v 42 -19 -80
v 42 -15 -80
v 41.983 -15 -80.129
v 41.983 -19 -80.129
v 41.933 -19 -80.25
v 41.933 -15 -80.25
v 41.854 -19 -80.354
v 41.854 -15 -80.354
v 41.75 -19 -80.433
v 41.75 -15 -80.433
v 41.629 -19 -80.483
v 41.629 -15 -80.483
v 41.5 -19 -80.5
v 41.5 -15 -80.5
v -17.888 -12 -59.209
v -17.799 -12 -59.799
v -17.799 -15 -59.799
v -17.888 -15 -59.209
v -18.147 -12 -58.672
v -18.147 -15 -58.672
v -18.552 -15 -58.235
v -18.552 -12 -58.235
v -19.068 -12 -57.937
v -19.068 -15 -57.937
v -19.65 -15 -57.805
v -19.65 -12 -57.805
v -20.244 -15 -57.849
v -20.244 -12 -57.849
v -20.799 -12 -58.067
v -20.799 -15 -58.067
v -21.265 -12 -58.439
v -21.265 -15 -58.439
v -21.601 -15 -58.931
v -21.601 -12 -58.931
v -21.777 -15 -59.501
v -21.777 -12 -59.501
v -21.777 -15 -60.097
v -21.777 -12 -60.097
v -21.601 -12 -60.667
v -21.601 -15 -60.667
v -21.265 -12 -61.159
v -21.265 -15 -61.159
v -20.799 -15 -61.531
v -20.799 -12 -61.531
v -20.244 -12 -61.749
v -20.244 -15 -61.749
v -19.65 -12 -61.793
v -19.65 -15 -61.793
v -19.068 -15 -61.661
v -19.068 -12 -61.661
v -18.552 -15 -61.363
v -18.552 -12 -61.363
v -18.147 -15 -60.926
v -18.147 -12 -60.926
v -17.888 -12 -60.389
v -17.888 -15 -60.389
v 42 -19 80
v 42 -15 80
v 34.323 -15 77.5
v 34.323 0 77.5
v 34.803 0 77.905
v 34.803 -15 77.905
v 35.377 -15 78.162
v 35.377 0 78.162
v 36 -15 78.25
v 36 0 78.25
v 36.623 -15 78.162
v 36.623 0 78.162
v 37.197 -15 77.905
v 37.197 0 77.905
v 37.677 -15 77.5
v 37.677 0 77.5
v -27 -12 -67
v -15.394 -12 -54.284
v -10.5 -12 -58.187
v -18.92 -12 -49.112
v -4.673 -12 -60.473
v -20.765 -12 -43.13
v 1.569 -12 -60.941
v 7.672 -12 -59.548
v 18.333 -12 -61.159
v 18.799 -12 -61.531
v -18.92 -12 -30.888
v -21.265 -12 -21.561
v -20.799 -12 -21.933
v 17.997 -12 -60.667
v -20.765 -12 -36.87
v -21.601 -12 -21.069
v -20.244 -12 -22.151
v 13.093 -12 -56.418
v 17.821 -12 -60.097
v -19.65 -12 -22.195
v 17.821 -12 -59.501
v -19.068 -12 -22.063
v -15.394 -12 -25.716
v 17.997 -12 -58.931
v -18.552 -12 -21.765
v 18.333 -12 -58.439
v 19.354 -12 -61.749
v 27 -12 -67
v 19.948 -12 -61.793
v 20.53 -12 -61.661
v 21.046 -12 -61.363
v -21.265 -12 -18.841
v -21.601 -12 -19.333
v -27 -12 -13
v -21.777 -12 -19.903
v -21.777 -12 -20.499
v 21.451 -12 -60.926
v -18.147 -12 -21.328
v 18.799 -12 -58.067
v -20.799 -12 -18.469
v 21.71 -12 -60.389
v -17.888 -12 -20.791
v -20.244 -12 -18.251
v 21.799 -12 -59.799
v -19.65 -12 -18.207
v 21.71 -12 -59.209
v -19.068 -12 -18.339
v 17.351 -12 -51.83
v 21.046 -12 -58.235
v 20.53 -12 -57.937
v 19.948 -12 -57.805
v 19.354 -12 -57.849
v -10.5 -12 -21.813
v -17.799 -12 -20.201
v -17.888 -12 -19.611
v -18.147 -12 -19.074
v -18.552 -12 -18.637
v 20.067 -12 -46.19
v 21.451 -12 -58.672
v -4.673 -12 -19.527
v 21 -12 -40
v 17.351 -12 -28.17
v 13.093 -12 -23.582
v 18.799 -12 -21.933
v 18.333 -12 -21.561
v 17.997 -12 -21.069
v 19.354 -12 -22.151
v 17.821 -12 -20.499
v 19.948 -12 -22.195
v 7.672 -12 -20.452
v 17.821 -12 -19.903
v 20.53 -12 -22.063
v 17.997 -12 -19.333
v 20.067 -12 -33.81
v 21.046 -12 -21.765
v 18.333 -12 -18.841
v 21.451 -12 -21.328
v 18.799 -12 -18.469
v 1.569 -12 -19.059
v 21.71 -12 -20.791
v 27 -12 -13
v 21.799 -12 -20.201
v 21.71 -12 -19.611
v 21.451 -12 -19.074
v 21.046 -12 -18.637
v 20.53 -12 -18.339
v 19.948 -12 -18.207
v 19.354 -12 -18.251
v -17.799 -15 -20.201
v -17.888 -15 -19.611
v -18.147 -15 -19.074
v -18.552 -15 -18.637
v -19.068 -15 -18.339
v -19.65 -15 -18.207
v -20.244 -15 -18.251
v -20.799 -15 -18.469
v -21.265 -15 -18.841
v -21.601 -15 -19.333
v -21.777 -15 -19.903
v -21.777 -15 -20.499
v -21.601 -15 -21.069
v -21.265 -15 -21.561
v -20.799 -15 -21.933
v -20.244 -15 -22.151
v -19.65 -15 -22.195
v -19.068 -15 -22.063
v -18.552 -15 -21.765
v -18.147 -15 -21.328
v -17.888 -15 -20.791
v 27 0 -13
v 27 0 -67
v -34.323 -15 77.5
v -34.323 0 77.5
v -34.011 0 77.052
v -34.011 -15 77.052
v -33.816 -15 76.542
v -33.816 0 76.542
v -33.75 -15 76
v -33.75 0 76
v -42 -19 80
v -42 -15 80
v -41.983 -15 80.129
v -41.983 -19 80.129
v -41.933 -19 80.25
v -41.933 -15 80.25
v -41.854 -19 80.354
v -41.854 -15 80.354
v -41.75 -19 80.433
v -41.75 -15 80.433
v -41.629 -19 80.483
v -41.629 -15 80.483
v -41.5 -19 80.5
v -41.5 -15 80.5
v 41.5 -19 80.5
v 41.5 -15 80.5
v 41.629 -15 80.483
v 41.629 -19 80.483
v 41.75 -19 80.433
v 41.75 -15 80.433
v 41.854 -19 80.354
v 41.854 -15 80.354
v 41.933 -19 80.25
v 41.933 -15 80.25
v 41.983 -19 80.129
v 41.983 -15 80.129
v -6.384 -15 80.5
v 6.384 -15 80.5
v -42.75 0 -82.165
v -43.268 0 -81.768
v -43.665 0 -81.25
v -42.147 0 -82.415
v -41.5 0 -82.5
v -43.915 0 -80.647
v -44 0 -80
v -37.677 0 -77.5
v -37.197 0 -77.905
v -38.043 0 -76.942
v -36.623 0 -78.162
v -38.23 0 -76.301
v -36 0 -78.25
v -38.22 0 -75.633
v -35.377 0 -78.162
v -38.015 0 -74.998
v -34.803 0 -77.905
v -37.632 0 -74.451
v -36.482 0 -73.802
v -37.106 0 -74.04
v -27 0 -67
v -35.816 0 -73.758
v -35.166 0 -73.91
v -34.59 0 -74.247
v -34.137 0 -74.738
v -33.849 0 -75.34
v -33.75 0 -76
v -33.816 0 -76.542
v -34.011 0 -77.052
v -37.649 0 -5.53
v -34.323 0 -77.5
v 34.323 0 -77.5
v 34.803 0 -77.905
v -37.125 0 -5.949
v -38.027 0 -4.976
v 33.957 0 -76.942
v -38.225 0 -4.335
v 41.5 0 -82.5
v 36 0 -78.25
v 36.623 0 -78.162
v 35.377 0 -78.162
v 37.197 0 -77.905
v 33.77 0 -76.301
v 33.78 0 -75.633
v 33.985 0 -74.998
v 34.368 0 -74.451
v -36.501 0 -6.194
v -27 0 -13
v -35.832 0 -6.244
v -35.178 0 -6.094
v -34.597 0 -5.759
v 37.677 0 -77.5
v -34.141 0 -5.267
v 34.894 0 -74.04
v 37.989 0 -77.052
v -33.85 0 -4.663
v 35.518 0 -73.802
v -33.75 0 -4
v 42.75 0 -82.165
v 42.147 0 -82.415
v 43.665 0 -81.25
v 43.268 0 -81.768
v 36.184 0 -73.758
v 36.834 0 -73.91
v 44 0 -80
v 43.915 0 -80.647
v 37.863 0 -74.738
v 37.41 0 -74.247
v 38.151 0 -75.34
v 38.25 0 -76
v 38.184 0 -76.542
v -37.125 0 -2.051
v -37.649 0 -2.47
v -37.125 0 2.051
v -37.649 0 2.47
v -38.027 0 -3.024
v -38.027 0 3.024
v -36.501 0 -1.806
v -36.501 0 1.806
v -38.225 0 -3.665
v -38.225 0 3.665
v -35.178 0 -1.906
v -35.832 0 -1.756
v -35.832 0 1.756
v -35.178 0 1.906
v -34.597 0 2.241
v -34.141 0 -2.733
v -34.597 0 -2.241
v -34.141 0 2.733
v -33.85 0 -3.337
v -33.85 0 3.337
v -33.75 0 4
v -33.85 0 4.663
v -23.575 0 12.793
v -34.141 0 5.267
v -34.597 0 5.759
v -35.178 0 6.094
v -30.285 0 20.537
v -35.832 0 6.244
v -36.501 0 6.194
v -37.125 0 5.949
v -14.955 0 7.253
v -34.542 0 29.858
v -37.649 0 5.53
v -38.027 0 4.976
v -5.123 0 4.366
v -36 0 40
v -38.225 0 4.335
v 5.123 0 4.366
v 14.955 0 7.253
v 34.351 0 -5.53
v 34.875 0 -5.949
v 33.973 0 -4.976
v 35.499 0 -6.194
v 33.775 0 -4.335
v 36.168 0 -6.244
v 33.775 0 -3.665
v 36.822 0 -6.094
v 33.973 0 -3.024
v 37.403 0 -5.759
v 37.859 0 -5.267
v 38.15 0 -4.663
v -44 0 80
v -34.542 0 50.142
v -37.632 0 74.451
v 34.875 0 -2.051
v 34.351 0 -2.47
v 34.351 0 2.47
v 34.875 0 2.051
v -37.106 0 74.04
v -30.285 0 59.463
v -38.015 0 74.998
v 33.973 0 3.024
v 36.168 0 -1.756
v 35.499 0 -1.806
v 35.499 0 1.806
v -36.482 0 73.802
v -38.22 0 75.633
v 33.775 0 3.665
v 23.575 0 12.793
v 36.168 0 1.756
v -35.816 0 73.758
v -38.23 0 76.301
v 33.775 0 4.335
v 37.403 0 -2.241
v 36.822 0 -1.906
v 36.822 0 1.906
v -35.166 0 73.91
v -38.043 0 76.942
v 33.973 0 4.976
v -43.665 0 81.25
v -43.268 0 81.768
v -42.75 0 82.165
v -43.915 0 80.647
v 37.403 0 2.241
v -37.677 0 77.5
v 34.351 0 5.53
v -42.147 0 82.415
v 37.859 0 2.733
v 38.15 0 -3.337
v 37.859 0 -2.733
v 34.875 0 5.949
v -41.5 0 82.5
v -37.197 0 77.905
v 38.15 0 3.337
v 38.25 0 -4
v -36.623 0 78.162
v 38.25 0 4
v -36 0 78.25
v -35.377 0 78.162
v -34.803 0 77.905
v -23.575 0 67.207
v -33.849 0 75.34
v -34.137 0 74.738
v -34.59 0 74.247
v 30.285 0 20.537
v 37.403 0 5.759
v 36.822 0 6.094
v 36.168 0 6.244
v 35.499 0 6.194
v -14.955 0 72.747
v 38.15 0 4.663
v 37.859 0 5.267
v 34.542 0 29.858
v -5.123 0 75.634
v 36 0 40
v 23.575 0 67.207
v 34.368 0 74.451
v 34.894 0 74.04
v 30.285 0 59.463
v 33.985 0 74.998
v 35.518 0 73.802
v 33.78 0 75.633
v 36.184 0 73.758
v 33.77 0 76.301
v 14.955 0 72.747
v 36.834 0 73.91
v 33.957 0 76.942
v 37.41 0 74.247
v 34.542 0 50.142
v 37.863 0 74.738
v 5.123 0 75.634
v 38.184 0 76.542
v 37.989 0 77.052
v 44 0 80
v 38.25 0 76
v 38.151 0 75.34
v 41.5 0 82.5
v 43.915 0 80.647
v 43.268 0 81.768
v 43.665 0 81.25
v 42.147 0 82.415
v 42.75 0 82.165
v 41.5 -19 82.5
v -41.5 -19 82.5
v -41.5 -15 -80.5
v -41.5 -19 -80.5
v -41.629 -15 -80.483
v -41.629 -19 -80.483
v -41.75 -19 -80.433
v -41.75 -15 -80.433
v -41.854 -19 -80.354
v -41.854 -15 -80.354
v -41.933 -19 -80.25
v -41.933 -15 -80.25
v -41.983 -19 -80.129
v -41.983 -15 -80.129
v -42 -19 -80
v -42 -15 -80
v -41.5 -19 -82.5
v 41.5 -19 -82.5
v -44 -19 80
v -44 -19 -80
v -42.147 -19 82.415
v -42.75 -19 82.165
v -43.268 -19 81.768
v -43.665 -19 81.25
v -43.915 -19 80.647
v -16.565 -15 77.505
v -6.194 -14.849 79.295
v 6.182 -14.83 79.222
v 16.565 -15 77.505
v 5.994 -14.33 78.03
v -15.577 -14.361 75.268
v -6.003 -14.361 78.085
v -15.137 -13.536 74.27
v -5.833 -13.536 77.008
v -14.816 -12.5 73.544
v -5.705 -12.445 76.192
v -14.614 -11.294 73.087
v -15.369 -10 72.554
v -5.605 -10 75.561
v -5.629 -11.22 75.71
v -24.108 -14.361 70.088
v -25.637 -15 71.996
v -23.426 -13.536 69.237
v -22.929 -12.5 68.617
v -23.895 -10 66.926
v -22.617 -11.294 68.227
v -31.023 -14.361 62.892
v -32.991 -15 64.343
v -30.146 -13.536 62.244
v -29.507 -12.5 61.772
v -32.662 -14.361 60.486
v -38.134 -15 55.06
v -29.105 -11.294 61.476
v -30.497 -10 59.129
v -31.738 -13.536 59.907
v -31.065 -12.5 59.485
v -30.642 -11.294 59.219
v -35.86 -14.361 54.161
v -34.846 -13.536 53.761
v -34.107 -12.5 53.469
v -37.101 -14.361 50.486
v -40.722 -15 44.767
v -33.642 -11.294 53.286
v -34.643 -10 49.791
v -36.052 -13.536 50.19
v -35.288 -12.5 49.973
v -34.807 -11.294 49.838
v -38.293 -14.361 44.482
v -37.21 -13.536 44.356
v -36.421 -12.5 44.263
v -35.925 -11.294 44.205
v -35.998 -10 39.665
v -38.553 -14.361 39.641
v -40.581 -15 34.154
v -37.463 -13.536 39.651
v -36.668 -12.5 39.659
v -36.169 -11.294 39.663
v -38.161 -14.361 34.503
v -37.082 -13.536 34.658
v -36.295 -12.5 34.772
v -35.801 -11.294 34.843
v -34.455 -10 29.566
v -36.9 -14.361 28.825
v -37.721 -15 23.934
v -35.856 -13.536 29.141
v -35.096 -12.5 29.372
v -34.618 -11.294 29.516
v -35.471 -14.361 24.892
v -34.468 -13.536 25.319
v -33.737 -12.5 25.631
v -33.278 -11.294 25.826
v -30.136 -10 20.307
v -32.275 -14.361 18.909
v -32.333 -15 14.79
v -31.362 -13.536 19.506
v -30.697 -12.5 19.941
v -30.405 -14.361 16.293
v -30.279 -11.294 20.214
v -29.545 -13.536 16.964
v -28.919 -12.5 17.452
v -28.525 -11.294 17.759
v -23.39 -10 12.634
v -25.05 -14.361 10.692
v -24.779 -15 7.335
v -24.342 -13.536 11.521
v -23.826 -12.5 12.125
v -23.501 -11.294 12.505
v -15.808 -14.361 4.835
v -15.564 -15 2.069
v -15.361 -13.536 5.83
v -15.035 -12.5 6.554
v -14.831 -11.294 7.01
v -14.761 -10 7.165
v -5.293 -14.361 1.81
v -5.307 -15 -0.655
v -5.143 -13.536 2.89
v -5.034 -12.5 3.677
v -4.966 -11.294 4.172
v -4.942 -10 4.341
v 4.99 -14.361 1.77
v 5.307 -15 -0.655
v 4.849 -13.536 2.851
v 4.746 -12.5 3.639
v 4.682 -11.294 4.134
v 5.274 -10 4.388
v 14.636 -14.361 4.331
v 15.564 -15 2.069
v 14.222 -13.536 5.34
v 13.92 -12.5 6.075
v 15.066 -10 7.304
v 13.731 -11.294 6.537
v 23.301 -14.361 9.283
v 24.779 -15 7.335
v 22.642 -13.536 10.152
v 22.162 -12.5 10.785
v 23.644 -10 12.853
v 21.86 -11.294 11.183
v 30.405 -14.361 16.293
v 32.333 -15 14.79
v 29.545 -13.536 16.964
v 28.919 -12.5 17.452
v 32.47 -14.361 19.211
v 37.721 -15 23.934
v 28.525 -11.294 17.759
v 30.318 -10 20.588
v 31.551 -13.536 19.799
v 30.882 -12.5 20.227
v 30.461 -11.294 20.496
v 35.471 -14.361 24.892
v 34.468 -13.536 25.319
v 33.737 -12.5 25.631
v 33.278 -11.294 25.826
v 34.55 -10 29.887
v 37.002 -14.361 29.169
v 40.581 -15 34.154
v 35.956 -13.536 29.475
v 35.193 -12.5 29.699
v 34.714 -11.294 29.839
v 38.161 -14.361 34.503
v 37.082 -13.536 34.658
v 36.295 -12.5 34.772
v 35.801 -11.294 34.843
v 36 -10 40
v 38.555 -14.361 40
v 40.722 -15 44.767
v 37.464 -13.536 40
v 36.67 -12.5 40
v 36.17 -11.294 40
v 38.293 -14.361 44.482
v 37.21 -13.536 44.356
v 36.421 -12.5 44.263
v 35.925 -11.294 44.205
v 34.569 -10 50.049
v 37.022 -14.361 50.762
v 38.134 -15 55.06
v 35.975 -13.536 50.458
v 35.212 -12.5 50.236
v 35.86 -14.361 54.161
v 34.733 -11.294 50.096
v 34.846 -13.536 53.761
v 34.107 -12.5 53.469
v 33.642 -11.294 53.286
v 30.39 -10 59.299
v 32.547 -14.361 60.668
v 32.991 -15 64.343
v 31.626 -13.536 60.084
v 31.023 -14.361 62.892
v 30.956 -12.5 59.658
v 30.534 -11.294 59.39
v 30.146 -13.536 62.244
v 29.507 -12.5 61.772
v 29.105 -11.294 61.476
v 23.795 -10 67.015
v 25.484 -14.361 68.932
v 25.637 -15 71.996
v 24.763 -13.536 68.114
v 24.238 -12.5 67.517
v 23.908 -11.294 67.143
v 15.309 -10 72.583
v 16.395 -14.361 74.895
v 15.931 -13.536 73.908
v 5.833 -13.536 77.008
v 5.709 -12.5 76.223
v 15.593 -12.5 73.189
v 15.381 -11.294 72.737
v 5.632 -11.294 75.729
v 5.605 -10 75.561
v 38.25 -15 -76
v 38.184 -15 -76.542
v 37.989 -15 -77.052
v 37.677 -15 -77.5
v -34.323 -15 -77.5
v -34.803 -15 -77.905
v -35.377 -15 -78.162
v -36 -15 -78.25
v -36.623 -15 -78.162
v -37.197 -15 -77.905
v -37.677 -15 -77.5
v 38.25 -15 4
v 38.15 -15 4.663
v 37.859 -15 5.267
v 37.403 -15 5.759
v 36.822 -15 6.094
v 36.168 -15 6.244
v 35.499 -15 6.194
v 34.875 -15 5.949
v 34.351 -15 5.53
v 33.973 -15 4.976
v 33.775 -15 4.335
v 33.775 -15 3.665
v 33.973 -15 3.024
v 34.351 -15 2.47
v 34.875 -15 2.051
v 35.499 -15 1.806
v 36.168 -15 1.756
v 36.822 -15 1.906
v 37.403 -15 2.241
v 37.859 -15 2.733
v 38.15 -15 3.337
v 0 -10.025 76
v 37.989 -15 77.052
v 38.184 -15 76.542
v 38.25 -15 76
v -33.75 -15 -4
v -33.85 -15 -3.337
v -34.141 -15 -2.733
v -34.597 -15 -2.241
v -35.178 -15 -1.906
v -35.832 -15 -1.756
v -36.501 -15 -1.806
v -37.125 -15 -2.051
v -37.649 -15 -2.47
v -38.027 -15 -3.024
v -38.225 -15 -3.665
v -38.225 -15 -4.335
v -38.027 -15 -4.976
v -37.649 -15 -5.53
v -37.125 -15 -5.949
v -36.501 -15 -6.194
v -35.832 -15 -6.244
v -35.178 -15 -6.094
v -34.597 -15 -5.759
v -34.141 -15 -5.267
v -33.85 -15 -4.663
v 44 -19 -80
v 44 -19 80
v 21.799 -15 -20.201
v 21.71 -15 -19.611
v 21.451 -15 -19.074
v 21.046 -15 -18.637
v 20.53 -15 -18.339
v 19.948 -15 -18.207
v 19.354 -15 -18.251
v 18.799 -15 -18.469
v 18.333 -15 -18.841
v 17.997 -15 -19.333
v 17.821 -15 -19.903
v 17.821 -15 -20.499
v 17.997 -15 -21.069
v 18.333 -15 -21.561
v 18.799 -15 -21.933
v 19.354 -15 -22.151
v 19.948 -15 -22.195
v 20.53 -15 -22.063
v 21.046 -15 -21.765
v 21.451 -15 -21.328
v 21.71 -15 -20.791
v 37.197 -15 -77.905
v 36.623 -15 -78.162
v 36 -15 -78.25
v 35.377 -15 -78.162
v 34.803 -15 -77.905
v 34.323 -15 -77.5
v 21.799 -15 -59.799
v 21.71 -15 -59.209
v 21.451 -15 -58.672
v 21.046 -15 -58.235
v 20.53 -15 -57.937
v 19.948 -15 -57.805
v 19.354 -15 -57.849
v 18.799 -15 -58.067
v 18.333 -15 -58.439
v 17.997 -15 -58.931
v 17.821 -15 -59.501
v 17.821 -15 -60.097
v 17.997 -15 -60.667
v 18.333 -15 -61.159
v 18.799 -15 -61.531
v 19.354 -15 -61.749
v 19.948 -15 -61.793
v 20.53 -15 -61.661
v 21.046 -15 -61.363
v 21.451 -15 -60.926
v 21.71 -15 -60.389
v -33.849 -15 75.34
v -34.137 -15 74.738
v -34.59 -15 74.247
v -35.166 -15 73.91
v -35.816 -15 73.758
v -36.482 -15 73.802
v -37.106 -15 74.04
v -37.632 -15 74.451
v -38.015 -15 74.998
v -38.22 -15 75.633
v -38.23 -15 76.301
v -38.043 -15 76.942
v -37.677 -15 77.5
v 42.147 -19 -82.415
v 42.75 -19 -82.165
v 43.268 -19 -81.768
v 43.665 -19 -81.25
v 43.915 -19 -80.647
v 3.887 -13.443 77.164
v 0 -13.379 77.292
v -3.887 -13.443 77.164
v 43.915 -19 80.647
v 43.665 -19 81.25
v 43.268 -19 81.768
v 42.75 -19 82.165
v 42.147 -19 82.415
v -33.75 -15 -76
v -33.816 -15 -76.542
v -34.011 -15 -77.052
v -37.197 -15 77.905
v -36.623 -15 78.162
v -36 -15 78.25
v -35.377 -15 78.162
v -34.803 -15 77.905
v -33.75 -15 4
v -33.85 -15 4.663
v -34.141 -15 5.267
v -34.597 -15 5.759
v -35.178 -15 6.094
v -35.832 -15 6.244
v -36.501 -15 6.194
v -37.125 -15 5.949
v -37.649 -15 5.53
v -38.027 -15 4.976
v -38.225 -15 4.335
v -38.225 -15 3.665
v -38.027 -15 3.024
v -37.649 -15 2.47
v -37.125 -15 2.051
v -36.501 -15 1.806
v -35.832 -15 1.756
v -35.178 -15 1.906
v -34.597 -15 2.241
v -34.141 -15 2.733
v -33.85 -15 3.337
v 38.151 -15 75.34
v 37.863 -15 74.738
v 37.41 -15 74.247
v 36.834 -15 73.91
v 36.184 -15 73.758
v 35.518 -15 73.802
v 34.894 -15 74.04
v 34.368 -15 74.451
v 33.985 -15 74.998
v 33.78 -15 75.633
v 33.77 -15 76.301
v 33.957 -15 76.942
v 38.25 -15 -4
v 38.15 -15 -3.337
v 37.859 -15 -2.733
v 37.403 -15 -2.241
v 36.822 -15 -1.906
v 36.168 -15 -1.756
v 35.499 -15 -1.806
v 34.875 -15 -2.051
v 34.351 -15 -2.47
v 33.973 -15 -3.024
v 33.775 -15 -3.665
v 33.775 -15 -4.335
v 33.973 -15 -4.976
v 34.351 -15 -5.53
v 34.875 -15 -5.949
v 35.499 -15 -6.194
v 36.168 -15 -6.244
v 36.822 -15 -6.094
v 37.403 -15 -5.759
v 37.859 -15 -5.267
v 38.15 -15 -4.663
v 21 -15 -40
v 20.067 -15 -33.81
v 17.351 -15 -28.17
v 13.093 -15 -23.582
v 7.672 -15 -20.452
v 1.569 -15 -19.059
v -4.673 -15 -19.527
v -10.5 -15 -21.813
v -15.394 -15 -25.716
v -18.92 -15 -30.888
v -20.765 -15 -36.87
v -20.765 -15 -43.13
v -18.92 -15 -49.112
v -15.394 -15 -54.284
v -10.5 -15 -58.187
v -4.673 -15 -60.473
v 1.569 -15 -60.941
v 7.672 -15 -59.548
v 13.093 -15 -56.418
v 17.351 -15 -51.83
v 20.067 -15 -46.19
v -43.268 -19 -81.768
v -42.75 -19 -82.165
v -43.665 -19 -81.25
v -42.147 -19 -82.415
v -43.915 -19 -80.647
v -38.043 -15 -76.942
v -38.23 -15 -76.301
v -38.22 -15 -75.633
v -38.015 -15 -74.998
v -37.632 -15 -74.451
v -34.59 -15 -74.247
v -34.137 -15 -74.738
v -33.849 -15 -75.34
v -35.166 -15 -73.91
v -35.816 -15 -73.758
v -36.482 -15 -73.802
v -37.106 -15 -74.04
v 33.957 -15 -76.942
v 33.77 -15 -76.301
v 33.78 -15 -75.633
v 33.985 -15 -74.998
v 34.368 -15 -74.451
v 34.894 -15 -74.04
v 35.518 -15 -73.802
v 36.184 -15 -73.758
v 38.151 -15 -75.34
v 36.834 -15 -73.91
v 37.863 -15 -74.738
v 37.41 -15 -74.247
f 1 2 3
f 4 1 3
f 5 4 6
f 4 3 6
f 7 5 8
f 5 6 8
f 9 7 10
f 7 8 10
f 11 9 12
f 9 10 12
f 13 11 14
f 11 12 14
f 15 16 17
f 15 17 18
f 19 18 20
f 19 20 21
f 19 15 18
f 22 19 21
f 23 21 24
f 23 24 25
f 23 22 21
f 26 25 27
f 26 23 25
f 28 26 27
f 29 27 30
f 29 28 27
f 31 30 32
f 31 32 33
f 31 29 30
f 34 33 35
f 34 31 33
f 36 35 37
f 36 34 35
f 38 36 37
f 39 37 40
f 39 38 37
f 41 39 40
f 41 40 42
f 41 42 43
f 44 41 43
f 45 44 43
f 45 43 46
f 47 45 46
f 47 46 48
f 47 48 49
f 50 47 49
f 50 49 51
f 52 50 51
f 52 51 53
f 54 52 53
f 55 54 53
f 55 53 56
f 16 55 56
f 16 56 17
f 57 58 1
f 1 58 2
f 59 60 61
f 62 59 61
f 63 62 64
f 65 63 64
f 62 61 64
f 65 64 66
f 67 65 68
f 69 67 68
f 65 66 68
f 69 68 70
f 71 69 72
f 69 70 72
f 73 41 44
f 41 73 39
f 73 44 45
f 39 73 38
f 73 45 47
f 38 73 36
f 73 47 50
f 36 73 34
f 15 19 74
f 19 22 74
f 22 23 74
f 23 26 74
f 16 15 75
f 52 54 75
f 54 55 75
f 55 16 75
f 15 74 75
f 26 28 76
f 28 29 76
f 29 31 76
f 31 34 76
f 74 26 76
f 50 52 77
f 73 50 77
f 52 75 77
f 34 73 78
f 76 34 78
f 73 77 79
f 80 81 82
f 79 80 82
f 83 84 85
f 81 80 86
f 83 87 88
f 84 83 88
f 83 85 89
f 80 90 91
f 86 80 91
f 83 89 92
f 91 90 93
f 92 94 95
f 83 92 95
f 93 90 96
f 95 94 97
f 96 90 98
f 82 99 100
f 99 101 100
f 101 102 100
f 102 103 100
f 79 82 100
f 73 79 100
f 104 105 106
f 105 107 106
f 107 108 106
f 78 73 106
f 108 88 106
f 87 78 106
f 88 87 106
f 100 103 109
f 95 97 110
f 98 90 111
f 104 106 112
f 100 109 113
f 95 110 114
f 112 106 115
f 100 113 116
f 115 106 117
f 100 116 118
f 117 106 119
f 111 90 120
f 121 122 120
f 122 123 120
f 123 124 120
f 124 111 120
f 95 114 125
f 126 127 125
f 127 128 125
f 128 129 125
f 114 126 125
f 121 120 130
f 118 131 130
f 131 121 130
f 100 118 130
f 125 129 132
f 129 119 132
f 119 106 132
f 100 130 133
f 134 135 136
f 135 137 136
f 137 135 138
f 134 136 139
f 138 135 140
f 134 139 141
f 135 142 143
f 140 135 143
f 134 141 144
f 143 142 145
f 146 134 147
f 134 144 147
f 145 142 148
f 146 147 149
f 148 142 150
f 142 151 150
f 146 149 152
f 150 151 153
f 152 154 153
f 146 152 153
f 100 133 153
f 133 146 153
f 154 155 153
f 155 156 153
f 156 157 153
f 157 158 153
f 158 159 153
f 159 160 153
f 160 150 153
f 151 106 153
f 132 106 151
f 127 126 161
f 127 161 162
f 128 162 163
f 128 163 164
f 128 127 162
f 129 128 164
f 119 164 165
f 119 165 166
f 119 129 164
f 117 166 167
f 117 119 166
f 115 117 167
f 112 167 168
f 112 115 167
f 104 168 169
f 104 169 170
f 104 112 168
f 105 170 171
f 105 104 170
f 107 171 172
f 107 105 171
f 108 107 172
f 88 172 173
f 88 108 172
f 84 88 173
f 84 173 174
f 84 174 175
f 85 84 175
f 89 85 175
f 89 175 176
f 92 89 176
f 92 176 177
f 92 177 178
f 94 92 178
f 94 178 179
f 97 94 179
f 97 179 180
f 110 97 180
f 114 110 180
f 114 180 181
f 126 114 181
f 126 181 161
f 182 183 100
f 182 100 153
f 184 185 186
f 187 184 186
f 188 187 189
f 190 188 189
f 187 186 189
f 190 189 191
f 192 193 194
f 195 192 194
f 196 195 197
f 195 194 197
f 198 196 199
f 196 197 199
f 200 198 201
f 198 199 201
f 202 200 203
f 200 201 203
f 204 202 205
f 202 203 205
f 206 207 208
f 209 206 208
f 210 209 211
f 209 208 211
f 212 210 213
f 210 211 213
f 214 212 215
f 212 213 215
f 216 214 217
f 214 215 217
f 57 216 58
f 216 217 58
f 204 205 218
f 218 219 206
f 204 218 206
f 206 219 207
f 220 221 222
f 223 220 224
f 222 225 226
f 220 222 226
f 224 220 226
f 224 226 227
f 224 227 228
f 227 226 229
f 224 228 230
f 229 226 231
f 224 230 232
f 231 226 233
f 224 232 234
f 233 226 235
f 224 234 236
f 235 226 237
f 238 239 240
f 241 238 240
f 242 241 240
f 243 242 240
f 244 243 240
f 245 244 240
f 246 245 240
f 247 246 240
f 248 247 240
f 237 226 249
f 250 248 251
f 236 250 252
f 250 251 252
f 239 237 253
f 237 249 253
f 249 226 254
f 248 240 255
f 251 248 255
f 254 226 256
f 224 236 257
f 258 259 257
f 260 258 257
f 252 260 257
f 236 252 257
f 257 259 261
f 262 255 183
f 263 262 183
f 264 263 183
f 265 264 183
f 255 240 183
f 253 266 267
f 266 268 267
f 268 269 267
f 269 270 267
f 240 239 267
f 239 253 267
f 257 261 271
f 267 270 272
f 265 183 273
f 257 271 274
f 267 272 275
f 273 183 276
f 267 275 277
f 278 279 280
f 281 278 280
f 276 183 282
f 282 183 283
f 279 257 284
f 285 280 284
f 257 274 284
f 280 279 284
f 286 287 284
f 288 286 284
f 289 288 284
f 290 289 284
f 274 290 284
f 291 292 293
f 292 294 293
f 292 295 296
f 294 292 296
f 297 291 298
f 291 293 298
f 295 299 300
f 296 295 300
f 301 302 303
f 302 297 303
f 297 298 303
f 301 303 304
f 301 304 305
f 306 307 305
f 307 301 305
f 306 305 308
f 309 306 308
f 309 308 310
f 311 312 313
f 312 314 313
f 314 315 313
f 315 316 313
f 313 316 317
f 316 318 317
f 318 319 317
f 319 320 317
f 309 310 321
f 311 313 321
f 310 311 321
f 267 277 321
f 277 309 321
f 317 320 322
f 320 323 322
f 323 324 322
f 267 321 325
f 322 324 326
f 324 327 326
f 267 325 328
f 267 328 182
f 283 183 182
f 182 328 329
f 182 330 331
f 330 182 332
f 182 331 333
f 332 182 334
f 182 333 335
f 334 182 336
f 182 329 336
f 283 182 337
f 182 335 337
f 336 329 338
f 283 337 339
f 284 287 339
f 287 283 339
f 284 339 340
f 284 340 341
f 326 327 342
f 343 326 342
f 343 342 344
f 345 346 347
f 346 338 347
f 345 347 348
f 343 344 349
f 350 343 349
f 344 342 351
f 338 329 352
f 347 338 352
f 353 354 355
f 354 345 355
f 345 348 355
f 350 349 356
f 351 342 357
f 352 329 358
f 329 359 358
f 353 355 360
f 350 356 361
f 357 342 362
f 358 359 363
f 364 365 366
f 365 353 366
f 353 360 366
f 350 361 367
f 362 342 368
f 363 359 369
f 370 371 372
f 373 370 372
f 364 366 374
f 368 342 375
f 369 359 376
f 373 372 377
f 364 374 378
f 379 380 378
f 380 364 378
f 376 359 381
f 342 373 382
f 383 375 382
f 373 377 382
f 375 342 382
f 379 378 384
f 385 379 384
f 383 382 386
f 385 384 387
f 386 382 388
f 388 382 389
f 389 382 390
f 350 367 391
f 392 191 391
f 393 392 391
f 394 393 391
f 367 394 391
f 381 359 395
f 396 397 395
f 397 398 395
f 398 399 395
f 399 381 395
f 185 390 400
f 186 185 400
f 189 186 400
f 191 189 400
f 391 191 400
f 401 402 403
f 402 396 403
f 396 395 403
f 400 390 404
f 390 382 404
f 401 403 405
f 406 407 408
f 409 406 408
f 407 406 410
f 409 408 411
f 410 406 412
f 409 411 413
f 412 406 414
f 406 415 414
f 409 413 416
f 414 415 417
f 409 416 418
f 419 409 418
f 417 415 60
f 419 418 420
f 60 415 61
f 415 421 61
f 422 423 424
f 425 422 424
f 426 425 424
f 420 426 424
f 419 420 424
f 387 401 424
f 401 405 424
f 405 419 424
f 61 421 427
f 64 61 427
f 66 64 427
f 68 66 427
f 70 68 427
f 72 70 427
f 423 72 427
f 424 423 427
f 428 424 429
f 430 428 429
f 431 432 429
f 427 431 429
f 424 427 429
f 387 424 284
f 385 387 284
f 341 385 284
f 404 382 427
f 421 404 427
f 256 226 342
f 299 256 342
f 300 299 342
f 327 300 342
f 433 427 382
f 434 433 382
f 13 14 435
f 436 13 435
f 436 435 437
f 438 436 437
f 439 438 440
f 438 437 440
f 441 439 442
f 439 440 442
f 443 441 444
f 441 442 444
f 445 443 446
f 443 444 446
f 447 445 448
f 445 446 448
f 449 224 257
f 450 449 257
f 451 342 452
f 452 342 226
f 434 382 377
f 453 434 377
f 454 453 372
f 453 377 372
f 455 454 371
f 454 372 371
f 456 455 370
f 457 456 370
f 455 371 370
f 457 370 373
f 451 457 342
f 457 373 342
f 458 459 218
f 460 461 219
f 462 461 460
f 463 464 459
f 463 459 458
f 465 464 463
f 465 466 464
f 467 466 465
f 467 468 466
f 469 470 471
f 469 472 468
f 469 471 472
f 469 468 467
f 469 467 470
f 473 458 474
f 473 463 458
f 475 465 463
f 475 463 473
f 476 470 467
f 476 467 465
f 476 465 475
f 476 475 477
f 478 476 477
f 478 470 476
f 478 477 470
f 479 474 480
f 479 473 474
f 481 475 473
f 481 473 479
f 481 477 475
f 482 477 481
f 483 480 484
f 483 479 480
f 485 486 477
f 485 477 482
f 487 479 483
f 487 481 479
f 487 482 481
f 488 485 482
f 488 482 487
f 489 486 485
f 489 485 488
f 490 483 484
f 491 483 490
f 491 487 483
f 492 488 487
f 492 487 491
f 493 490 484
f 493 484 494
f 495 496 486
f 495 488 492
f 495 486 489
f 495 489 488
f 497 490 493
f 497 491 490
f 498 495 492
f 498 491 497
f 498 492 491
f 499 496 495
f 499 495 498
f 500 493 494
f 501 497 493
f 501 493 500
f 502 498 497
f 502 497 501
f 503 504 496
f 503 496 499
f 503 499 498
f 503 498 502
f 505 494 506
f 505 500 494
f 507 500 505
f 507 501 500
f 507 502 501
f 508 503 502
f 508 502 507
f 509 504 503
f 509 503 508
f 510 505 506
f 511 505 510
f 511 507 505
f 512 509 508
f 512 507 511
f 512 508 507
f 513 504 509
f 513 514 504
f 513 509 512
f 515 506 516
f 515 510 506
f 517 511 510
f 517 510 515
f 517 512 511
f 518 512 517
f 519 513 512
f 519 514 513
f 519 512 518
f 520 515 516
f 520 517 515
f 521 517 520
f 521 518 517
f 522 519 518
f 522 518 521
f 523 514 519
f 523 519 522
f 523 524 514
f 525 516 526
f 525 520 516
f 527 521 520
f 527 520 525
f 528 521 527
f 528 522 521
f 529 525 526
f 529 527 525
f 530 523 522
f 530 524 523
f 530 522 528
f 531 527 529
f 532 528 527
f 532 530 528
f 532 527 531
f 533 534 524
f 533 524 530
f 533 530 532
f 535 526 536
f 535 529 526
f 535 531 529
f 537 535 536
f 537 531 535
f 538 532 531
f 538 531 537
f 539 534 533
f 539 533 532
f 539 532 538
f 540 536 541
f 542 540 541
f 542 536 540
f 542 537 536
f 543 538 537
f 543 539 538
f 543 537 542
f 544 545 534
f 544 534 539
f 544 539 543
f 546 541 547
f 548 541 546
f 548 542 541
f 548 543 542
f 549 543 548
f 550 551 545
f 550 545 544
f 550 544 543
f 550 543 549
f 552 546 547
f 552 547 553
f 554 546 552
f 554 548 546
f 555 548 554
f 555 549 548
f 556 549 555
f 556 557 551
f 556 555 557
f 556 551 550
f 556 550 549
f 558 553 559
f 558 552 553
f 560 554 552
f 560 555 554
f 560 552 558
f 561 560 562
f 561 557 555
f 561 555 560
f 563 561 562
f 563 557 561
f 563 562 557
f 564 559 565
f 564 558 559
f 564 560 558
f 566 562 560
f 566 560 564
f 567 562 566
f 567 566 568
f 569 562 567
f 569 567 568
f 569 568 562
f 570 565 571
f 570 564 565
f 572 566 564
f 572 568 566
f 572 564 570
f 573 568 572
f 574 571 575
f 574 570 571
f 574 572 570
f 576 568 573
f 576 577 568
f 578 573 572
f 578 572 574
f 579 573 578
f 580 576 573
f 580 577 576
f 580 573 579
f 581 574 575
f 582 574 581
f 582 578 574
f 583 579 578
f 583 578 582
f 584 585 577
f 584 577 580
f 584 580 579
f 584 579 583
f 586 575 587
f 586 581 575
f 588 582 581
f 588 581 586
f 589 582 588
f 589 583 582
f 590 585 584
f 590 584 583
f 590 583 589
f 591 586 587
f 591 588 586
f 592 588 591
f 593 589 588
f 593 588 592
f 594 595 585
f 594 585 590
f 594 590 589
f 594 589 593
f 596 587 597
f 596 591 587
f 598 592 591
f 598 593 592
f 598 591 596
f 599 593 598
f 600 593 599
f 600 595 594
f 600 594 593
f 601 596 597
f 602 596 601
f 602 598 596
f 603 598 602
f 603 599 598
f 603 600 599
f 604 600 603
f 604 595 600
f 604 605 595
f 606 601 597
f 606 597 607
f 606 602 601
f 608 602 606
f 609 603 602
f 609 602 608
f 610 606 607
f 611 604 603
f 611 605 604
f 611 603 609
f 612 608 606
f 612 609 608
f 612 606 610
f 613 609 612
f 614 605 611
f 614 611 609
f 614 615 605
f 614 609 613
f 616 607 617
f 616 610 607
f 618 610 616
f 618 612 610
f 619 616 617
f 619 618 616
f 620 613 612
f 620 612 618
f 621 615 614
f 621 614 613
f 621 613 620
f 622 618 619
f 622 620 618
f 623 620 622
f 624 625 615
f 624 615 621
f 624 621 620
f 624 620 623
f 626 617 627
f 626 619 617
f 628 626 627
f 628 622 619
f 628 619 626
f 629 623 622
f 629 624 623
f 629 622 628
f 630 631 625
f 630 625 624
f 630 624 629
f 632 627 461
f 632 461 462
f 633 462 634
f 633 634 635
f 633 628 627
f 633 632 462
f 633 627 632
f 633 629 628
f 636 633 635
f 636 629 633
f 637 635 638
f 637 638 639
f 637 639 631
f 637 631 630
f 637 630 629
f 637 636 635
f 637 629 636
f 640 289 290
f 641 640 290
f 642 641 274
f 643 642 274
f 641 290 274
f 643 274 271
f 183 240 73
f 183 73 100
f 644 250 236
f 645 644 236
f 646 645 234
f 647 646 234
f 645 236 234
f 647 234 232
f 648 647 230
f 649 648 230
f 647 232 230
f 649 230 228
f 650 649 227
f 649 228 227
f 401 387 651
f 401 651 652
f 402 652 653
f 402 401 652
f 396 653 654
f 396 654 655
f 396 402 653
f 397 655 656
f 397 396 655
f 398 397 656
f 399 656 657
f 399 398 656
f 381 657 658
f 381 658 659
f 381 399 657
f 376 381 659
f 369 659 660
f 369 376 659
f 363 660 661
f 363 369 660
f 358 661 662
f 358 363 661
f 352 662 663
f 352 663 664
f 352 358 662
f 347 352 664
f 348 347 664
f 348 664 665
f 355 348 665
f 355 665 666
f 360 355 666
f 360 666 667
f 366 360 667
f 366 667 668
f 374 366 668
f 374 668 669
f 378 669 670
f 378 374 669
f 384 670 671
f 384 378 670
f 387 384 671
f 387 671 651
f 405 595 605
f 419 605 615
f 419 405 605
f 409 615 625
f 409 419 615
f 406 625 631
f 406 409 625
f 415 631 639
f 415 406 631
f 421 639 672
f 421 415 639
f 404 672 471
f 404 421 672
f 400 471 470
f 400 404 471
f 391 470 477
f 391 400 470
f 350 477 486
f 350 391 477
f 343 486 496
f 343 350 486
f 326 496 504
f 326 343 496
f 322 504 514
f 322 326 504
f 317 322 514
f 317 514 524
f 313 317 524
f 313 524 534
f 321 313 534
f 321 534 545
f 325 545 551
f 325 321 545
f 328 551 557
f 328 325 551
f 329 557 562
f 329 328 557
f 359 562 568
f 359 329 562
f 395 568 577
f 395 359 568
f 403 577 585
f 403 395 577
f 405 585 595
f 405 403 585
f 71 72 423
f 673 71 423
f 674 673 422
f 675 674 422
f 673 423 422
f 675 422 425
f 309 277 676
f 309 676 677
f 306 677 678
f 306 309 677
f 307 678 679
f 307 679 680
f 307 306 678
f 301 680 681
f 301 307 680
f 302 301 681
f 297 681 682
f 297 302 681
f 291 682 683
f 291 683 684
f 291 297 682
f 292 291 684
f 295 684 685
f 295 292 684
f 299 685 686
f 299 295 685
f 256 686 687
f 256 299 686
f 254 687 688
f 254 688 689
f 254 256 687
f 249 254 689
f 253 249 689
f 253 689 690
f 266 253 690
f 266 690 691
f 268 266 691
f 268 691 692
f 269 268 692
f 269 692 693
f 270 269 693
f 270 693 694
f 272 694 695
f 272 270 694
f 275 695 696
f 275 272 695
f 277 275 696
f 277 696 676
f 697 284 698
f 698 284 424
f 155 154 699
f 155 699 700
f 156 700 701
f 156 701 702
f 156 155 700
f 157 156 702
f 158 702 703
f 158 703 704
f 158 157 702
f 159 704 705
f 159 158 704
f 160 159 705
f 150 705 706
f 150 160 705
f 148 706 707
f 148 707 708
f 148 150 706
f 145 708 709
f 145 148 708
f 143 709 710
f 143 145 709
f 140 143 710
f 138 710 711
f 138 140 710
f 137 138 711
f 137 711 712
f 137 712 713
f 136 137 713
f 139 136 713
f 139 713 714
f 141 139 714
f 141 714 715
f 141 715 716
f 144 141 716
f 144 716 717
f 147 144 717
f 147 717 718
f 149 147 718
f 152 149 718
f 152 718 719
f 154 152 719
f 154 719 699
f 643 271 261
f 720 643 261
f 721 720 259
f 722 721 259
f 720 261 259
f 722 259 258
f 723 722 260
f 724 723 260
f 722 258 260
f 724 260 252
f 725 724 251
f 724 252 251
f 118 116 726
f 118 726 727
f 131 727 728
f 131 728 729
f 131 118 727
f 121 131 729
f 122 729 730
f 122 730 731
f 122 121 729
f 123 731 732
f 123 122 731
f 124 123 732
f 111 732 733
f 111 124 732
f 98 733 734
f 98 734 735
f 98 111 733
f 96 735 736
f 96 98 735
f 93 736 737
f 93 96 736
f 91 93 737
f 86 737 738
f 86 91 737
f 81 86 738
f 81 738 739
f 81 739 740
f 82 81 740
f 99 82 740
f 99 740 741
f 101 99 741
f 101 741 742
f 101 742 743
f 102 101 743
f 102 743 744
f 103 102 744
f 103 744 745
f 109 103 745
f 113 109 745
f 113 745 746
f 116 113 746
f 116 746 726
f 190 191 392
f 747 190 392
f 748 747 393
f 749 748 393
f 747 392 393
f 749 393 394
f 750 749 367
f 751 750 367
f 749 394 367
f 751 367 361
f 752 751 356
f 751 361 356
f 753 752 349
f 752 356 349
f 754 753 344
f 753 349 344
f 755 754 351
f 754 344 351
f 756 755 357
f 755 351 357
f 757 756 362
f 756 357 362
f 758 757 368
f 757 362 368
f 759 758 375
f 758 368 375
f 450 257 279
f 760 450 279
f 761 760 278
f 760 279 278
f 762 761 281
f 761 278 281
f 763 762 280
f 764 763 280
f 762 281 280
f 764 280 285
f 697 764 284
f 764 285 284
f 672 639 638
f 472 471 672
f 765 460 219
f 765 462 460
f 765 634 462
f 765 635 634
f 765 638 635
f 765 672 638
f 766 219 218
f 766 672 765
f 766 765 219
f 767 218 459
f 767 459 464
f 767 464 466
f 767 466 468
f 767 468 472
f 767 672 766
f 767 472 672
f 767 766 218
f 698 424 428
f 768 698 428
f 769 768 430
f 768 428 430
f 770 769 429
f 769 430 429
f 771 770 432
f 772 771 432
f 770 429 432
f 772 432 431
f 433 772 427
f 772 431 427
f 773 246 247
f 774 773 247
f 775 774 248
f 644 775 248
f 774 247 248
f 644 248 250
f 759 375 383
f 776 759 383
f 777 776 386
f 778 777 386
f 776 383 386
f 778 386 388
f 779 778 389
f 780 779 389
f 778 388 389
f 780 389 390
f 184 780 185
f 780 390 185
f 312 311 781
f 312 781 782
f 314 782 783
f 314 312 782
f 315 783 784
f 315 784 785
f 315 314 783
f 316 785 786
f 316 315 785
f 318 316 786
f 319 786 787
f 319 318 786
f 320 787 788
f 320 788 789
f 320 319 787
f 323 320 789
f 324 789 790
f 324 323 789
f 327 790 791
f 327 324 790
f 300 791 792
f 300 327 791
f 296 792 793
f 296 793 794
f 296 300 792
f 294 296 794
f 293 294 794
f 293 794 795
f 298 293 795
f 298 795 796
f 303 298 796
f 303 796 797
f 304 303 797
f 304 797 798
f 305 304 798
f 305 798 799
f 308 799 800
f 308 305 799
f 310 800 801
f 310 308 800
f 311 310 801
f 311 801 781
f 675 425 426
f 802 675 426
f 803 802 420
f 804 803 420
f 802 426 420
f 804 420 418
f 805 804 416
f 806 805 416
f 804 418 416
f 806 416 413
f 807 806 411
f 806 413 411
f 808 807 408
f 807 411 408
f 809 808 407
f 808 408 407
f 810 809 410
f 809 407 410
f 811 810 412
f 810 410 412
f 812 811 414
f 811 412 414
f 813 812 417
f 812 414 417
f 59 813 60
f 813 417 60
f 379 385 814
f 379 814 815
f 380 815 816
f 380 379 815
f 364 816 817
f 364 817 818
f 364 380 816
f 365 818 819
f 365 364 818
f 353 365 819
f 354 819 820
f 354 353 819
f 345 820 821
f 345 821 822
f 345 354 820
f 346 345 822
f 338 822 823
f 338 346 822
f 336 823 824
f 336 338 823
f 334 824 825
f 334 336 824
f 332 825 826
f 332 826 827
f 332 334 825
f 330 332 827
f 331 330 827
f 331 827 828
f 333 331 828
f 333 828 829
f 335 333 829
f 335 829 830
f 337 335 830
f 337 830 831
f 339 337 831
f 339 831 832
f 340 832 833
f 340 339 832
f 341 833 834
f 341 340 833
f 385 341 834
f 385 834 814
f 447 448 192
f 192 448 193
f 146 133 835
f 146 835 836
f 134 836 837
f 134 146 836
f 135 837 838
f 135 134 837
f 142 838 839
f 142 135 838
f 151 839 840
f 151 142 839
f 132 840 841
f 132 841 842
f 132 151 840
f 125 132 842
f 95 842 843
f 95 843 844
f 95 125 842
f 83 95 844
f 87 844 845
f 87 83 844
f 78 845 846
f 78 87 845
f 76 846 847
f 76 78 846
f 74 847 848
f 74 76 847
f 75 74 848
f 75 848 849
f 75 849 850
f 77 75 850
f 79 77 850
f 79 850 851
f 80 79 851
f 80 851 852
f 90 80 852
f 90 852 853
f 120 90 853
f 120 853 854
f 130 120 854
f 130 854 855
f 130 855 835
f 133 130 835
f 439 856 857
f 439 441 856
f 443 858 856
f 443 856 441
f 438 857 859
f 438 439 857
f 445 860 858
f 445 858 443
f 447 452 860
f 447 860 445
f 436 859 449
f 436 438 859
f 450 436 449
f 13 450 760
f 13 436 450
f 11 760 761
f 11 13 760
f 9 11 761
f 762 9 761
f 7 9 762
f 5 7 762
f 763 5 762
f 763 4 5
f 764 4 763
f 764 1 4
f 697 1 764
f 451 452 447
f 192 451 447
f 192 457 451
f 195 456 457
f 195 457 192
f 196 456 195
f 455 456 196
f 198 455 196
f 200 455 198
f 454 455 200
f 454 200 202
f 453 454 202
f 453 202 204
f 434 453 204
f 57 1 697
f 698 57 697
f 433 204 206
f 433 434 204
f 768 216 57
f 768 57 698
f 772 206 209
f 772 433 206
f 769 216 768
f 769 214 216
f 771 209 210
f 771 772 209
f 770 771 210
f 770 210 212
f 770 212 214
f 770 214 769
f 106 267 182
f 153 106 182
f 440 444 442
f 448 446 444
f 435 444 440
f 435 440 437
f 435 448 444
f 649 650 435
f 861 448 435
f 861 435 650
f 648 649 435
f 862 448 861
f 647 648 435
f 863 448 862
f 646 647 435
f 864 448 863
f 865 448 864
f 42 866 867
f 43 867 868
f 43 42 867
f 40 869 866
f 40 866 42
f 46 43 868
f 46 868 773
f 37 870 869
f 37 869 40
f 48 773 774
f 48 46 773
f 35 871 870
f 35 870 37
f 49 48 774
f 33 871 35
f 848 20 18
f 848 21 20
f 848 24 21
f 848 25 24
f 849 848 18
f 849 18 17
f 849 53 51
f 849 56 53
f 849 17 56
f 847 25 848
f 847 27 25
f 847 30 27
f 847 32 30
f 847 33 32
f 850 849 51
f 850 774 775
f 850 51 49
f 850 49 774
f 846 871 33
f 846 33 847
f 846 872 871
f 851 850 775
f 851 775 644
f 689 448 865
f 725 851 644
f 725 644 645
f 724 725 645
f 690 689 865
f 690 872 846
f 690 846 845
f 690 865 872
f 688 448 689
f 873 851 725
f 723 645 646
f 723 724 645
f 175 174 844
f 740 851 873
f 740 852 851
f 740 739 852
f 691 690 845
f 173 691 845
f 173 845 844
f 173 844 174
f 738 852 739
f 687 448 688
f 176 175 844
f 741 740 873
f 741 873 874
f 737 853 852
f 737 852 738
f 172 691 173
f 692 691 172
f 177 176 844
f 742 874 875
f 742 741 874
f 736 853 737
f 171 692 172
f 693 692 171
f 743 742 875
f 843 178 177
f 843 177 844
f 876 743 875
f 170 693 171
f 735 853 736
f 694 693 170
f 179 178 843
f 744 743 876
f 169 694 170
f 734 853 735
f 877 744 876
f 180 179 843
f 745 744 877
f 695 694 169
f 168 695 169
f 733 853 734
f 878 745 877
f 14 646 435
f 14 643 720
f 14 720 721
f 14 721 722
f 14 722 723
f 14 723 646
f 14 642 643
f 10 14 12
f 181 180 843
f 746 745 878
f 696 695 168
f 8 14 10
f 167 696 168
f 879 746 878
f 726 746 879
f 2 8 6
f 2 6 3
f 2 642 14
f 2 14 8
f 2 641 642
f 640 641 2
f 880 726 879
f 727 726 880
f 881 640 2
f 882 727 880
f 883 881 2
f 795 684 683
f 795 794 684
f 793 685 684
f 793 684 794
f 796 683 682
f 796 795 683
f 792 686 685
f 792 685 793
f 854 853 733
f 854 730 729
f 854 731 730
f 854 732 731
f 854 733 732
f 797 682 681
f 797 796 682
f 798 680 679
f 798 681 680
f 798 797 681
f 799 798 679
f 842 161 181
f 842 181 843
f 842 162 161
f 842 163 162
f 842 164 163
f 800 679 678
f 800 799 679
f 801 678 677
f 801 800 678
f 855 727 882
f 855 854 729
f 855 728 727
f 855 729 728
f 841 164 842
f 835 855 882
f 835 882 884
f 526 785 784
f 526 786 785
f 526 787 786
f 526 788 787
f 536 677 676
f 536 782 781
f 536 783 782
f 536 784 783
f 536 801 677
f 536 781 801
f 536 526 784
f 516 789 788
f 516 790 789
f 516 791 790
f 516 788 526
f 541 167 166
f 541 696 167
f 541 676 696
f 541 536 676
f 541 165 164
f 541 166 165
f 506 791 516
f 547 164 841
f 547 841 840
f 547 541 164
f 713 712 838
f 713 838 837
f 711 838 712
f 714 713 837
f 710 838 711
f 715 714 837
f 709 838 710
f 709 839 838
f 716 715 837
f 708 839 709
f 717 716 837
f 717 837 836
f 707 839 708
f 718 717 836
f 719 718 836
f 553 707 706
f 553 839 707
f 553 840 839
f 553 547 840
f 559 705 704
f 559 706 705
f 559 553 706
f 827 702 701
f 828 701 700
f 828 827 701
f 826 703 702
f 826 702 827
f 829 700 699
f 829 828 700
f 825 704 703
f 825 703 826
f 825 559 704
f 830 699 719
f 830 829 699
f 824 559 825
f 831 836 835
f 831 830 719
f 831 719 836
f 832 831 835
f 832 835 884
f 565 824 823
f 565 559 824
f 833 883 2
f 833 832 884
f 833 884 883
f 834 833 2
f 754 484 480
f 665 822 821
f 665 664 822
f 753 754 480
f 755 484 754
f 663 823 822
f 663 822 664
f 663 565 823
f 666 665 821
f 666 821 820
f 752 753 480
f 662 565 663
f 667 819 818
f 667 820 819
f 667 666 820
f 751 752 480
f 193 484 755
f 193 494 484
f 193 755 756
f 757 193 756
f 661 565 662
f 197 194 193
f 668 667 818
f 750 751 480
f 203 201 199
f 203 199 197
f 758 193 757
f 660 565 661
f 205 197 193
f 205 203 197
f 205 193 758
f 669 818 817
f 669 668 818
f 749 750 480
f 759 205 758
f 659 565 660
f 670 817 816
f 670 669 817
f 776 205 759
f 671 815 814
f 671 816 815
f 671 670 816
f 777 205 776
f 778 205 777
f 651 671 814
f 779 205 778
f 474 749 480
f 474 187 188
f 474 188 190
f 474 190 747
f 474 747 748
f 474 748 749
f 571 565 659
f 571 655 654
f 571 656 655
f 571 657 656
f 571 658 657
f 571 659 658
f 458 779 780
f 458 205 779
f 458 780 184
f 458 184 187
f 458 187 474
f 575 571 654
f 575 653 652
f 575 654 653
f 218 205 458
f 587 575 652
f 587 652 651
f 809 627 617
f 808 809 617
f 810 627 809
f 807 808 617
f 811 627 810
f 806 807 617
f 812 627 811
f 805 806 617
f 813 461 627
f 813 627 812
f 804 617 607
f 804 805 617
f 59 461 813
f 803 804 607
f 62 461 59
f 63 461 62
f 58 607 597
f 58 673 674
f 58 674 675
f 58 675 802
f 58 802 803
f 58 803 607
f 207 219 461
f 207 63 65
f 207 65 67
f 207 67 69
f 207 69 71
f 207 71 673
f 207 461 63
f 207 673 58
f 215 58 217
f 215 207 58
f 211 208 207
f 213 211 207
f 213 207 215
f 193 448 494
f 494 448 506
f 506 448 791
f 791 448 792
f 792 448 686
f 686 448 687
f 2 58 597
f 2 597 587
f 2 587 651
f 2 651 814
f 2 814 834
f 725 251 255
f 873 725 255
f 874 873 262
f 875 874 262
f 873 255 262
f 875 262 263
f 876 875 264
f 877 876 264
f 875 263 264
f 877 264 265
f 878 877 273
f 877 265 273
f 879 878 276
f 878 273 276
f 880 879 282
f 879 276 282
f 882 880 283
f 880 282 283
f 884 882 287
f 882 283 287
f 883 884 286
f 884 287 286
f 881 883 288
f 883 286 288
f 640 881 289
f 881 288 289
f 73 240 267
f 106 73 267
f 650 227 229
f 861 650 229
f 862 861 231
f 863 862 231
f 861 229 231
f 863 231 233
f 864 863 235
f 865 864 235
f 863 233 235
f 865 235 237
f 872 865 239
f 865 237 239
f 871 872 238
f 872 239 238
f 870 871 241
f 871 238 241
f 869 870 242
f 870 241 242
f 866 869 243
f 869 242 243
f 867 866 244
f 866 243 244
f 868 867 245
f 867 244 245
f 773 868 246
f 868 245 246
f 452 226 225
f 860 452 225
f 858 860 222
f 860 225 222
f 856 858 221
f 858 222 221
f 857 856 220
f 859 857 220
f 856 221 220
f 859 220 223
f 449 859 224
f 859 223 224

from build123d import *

# Parameters (mm, degrees)
F1_DEPTH = 19
F0_R     = 2.25
F0_W     = 54
F0_H     = 54
F0_R_2   = 36
F0_R_3   = 2
F0_R_4   = 21
F2_DEPTH = 15
F3_DEPTH = 12
F4_R     = 5


with BuildPart() as f1:
    # F0 (on Front) → F1 (new body)
    with BuildSketch(Plane.XZ):
        with BuildLine():
            Line((-41.5, -82.5), (41.5, -82.5))
            ThreePointArc((41.5, -82.5), (43.267767, -81.767767), (44, -80))
            Line((44, -80), (44, 80))
            ThreePointArc((44, 80), (43.267767, 81.767767), (41.5, 82.5))
            Line((41.5, 82.5), (-41.5, 82.5))
            ThreePointArc((-41.5, 82.5), (-43.267767, 81.767767), (-44, 80))
            Line((-44, 80), (-44, -80))
            ThreePointArc((-44, -80), (-43.267767, -81.767767), (-41.5, -82.5))
        make_face()
        with BuildLine():
            ThreePointArc((-41.5, -80.5), (-41.853553, -80.353553), (-42, -80))
            Line((-42, -80), (-42, 80))
            ThreePointArc((-42, 80), (-41.853553, 80.353553), (-41.5, 80.5))
            Line((-41.5, 80.5), (41.5, 80.5))
            ThreePointArc((41.5, 80.5), (41.853553, 80.353553), (42, 80))
            Line((42, 80), (42, -80))
            ThreePointArc((42, -80), (41.853553, -80.353553), (41.5, -80.5))
            Line((41.5, -80.5), (-41.5, -80.5))
        make_face(mode=Mode.SUBTRACT)
    extrude(amount=F1_DEPTH)

    # F0 (on Front) → F2 (join)
    with BuildSketch(Plane.XZ):
        with BuildLine():
            Line((-42, 80), (-42, -80))
            ThreePointArc((-42, -80), (-41.853553, -80.353553), (-41.5, -80.5))
            Line((-41.5, -80.5), (41.5, -80.5))
            ThreePointArc((41.5, -80.5), (41.853553, -80.353553), (42, -80))
            Line((42, -80), (42, 80))
            ThreePointArc((42, 80), (41.853553, 80.353553), (41.5, 80.5))
            Line((41.5, 80.5), (-41.5, 80.5))
            ThreePointArc((-41.5, 80.5), (-41.853553, 80.353553), (-42, 80))
        make_face()
        with BuildLine():
            ThreePointArc((-37.677051, 77.5), (-36, 78.25), (-34.322949, 77.5))
            Line((-34.322949, 77.5), (34.322949, 77.5))
            ThreePointArc((34.322949, 77.5), (36, 78.25), (37.677051, 77.5))
            Line((37.677051, 77.5), (39, 77.5))
            Line((39, 77.5), (39, -77.5))
            Line((39, -77.5), (37.677051, -77.5))
            ThreePointArc((37.677051, -77.5), (36, -78.25), (34.322949, -77.5))
            Line((34.322949, -77.5), (-34.322949, -77.5))
            ThreePointArc((-34.322949, -77.5), (-36, -78.25), (-37.677051, -77.5))
            Line((-37.677051, -77.5), (-39, -77.5))
            Line((-39, -77.5), (-39, 77.5))
            Line((-39, 77.5), (-37.677051, 77.5))
        make_face(mode=Mode.SUBTRACT)
        with BuildLine():
            ThreePointArc((-34.322949, 77.5), (-33.898112, 76.80285), (-33.75, 76))
            ThreePointArc((-33.75, 76), (-36.80285, 73.898112), (-37.677051, 77.5))
            Line((-37.677051, 77.5), (-39, 77.5))
            Line((-39, 77.5), (-39, -77.5))
            Line((-39, -77.5), (-37.677051, -77.5))
            ThreePointArc((-37.677051, -77.5), (-36.80285, -73.898112), (-33.75, -76))
            ThreePointArc((-33.75, -76), (-33.898112, -76.80285), (-34.322949, -77.5))
            Line((-34.322949, -77.5), (34.322949, -77.5))
            ThreePointArc((34.322949, -77.5), (35.19715, -73.898112), (38.25, -76))
            ThreePointArc((38.25, -76), (38.101888, -76.80285), (37.677051, -77.5))
            Line((37.677051, -77.5), (39, -77.5))
            Line((39, -77.5), (39, 77.5))
            Line((39, 77.5), (37.677051, 77.5))
            ThreePointArc((37.677051, 77.5), (38.101888, 76.80285), (38.25, 76))
            ThreePointArc((38.25, 76), (35.19715, 73.898112), (34.322949, 77.5))
            Line((34.322949, 77.5), (-34.322949, 77.5))
        make_face()
        with Locations((-36, -4)):
            Circle(F0_R, mode=Mode.SUBTRACT)
        with Locations((0, -40)):
            Rectangle(F0_W, F0_H, mode=Mode.SUBTRACT)
        with Locations((36, -4)):
            Circle(F0_R, mode=Mode.SUBTRACT)
        with Locations((-36, 4)):
            Circle(F0_R, mode=Mode.SUBTRACT)
        with Locations((0, 40)):
            Circle(F0_R_2, mode=Mode.SUBTRACT)
        with Locations((36, 4)):
            Circle(F0_R, mode=Mode.SUBTRACT)
        with Locations((0, -40)):
            Rectangle(F0_W, F0_H)
        with Locations((-19.79899, -59.79899)):
            Circle(F0_R_3, mode=Mode.SUBTRACT)
        with Locations((-19.79899, -20.20101)):
            Circle(F0_R_3, mode=Mode.SUBTRACT)
        with Locations((19.79899, -59.79899)):
            Circle(F0_R_3, mode=Mode.SUBTRACT)
        with Locations((0, -40)):
            Circle(F0_R_4, mode=Mode.SUBTRACT)
        with Locations((19.79899, -20.20101)):
            Circle(F0_R_3, mode=Mode.SUBTRACT)
    extrude(amount=F2_DEPTH)

    # F0 (on Front) → F3 (cut)
    with BuildSketch(Plane.XZ):
        with Locations((0, -40)):
            Rectangle(F0_W, F0_H)
        with Locations((-19.79899, -59.79899)):
            Circle(F0_R_3, mode=Mode.SUBTRACT)
        with Locations((-19.79899, -20.20101)):
            Circle(F0_R_3, mode=Mode.SUBTRACT)
        with Locations((19.79899, -59.79899)):
            Circle(F0_R_3, mode=Mode.SUBTRACT)
        with Locations((0, -40)):
            Circle(F0_R_4, mode=Mode.SUBTRACT)
        with Locations((19.79899, -20.20101)):
            Circle(F0_R_3, mode=Mode.SUBTRACT)
    extrude(amount=F3_DEPTH, mode=Mode.SUBTRACT)

    # F4
    f4_edges = [f1.edges().sort_by_distance(p)[0] for p in [
        (-36, -15, 40),
    ]]
    fillet(f4_edges, radius=F4_R)


solid = f1.part
